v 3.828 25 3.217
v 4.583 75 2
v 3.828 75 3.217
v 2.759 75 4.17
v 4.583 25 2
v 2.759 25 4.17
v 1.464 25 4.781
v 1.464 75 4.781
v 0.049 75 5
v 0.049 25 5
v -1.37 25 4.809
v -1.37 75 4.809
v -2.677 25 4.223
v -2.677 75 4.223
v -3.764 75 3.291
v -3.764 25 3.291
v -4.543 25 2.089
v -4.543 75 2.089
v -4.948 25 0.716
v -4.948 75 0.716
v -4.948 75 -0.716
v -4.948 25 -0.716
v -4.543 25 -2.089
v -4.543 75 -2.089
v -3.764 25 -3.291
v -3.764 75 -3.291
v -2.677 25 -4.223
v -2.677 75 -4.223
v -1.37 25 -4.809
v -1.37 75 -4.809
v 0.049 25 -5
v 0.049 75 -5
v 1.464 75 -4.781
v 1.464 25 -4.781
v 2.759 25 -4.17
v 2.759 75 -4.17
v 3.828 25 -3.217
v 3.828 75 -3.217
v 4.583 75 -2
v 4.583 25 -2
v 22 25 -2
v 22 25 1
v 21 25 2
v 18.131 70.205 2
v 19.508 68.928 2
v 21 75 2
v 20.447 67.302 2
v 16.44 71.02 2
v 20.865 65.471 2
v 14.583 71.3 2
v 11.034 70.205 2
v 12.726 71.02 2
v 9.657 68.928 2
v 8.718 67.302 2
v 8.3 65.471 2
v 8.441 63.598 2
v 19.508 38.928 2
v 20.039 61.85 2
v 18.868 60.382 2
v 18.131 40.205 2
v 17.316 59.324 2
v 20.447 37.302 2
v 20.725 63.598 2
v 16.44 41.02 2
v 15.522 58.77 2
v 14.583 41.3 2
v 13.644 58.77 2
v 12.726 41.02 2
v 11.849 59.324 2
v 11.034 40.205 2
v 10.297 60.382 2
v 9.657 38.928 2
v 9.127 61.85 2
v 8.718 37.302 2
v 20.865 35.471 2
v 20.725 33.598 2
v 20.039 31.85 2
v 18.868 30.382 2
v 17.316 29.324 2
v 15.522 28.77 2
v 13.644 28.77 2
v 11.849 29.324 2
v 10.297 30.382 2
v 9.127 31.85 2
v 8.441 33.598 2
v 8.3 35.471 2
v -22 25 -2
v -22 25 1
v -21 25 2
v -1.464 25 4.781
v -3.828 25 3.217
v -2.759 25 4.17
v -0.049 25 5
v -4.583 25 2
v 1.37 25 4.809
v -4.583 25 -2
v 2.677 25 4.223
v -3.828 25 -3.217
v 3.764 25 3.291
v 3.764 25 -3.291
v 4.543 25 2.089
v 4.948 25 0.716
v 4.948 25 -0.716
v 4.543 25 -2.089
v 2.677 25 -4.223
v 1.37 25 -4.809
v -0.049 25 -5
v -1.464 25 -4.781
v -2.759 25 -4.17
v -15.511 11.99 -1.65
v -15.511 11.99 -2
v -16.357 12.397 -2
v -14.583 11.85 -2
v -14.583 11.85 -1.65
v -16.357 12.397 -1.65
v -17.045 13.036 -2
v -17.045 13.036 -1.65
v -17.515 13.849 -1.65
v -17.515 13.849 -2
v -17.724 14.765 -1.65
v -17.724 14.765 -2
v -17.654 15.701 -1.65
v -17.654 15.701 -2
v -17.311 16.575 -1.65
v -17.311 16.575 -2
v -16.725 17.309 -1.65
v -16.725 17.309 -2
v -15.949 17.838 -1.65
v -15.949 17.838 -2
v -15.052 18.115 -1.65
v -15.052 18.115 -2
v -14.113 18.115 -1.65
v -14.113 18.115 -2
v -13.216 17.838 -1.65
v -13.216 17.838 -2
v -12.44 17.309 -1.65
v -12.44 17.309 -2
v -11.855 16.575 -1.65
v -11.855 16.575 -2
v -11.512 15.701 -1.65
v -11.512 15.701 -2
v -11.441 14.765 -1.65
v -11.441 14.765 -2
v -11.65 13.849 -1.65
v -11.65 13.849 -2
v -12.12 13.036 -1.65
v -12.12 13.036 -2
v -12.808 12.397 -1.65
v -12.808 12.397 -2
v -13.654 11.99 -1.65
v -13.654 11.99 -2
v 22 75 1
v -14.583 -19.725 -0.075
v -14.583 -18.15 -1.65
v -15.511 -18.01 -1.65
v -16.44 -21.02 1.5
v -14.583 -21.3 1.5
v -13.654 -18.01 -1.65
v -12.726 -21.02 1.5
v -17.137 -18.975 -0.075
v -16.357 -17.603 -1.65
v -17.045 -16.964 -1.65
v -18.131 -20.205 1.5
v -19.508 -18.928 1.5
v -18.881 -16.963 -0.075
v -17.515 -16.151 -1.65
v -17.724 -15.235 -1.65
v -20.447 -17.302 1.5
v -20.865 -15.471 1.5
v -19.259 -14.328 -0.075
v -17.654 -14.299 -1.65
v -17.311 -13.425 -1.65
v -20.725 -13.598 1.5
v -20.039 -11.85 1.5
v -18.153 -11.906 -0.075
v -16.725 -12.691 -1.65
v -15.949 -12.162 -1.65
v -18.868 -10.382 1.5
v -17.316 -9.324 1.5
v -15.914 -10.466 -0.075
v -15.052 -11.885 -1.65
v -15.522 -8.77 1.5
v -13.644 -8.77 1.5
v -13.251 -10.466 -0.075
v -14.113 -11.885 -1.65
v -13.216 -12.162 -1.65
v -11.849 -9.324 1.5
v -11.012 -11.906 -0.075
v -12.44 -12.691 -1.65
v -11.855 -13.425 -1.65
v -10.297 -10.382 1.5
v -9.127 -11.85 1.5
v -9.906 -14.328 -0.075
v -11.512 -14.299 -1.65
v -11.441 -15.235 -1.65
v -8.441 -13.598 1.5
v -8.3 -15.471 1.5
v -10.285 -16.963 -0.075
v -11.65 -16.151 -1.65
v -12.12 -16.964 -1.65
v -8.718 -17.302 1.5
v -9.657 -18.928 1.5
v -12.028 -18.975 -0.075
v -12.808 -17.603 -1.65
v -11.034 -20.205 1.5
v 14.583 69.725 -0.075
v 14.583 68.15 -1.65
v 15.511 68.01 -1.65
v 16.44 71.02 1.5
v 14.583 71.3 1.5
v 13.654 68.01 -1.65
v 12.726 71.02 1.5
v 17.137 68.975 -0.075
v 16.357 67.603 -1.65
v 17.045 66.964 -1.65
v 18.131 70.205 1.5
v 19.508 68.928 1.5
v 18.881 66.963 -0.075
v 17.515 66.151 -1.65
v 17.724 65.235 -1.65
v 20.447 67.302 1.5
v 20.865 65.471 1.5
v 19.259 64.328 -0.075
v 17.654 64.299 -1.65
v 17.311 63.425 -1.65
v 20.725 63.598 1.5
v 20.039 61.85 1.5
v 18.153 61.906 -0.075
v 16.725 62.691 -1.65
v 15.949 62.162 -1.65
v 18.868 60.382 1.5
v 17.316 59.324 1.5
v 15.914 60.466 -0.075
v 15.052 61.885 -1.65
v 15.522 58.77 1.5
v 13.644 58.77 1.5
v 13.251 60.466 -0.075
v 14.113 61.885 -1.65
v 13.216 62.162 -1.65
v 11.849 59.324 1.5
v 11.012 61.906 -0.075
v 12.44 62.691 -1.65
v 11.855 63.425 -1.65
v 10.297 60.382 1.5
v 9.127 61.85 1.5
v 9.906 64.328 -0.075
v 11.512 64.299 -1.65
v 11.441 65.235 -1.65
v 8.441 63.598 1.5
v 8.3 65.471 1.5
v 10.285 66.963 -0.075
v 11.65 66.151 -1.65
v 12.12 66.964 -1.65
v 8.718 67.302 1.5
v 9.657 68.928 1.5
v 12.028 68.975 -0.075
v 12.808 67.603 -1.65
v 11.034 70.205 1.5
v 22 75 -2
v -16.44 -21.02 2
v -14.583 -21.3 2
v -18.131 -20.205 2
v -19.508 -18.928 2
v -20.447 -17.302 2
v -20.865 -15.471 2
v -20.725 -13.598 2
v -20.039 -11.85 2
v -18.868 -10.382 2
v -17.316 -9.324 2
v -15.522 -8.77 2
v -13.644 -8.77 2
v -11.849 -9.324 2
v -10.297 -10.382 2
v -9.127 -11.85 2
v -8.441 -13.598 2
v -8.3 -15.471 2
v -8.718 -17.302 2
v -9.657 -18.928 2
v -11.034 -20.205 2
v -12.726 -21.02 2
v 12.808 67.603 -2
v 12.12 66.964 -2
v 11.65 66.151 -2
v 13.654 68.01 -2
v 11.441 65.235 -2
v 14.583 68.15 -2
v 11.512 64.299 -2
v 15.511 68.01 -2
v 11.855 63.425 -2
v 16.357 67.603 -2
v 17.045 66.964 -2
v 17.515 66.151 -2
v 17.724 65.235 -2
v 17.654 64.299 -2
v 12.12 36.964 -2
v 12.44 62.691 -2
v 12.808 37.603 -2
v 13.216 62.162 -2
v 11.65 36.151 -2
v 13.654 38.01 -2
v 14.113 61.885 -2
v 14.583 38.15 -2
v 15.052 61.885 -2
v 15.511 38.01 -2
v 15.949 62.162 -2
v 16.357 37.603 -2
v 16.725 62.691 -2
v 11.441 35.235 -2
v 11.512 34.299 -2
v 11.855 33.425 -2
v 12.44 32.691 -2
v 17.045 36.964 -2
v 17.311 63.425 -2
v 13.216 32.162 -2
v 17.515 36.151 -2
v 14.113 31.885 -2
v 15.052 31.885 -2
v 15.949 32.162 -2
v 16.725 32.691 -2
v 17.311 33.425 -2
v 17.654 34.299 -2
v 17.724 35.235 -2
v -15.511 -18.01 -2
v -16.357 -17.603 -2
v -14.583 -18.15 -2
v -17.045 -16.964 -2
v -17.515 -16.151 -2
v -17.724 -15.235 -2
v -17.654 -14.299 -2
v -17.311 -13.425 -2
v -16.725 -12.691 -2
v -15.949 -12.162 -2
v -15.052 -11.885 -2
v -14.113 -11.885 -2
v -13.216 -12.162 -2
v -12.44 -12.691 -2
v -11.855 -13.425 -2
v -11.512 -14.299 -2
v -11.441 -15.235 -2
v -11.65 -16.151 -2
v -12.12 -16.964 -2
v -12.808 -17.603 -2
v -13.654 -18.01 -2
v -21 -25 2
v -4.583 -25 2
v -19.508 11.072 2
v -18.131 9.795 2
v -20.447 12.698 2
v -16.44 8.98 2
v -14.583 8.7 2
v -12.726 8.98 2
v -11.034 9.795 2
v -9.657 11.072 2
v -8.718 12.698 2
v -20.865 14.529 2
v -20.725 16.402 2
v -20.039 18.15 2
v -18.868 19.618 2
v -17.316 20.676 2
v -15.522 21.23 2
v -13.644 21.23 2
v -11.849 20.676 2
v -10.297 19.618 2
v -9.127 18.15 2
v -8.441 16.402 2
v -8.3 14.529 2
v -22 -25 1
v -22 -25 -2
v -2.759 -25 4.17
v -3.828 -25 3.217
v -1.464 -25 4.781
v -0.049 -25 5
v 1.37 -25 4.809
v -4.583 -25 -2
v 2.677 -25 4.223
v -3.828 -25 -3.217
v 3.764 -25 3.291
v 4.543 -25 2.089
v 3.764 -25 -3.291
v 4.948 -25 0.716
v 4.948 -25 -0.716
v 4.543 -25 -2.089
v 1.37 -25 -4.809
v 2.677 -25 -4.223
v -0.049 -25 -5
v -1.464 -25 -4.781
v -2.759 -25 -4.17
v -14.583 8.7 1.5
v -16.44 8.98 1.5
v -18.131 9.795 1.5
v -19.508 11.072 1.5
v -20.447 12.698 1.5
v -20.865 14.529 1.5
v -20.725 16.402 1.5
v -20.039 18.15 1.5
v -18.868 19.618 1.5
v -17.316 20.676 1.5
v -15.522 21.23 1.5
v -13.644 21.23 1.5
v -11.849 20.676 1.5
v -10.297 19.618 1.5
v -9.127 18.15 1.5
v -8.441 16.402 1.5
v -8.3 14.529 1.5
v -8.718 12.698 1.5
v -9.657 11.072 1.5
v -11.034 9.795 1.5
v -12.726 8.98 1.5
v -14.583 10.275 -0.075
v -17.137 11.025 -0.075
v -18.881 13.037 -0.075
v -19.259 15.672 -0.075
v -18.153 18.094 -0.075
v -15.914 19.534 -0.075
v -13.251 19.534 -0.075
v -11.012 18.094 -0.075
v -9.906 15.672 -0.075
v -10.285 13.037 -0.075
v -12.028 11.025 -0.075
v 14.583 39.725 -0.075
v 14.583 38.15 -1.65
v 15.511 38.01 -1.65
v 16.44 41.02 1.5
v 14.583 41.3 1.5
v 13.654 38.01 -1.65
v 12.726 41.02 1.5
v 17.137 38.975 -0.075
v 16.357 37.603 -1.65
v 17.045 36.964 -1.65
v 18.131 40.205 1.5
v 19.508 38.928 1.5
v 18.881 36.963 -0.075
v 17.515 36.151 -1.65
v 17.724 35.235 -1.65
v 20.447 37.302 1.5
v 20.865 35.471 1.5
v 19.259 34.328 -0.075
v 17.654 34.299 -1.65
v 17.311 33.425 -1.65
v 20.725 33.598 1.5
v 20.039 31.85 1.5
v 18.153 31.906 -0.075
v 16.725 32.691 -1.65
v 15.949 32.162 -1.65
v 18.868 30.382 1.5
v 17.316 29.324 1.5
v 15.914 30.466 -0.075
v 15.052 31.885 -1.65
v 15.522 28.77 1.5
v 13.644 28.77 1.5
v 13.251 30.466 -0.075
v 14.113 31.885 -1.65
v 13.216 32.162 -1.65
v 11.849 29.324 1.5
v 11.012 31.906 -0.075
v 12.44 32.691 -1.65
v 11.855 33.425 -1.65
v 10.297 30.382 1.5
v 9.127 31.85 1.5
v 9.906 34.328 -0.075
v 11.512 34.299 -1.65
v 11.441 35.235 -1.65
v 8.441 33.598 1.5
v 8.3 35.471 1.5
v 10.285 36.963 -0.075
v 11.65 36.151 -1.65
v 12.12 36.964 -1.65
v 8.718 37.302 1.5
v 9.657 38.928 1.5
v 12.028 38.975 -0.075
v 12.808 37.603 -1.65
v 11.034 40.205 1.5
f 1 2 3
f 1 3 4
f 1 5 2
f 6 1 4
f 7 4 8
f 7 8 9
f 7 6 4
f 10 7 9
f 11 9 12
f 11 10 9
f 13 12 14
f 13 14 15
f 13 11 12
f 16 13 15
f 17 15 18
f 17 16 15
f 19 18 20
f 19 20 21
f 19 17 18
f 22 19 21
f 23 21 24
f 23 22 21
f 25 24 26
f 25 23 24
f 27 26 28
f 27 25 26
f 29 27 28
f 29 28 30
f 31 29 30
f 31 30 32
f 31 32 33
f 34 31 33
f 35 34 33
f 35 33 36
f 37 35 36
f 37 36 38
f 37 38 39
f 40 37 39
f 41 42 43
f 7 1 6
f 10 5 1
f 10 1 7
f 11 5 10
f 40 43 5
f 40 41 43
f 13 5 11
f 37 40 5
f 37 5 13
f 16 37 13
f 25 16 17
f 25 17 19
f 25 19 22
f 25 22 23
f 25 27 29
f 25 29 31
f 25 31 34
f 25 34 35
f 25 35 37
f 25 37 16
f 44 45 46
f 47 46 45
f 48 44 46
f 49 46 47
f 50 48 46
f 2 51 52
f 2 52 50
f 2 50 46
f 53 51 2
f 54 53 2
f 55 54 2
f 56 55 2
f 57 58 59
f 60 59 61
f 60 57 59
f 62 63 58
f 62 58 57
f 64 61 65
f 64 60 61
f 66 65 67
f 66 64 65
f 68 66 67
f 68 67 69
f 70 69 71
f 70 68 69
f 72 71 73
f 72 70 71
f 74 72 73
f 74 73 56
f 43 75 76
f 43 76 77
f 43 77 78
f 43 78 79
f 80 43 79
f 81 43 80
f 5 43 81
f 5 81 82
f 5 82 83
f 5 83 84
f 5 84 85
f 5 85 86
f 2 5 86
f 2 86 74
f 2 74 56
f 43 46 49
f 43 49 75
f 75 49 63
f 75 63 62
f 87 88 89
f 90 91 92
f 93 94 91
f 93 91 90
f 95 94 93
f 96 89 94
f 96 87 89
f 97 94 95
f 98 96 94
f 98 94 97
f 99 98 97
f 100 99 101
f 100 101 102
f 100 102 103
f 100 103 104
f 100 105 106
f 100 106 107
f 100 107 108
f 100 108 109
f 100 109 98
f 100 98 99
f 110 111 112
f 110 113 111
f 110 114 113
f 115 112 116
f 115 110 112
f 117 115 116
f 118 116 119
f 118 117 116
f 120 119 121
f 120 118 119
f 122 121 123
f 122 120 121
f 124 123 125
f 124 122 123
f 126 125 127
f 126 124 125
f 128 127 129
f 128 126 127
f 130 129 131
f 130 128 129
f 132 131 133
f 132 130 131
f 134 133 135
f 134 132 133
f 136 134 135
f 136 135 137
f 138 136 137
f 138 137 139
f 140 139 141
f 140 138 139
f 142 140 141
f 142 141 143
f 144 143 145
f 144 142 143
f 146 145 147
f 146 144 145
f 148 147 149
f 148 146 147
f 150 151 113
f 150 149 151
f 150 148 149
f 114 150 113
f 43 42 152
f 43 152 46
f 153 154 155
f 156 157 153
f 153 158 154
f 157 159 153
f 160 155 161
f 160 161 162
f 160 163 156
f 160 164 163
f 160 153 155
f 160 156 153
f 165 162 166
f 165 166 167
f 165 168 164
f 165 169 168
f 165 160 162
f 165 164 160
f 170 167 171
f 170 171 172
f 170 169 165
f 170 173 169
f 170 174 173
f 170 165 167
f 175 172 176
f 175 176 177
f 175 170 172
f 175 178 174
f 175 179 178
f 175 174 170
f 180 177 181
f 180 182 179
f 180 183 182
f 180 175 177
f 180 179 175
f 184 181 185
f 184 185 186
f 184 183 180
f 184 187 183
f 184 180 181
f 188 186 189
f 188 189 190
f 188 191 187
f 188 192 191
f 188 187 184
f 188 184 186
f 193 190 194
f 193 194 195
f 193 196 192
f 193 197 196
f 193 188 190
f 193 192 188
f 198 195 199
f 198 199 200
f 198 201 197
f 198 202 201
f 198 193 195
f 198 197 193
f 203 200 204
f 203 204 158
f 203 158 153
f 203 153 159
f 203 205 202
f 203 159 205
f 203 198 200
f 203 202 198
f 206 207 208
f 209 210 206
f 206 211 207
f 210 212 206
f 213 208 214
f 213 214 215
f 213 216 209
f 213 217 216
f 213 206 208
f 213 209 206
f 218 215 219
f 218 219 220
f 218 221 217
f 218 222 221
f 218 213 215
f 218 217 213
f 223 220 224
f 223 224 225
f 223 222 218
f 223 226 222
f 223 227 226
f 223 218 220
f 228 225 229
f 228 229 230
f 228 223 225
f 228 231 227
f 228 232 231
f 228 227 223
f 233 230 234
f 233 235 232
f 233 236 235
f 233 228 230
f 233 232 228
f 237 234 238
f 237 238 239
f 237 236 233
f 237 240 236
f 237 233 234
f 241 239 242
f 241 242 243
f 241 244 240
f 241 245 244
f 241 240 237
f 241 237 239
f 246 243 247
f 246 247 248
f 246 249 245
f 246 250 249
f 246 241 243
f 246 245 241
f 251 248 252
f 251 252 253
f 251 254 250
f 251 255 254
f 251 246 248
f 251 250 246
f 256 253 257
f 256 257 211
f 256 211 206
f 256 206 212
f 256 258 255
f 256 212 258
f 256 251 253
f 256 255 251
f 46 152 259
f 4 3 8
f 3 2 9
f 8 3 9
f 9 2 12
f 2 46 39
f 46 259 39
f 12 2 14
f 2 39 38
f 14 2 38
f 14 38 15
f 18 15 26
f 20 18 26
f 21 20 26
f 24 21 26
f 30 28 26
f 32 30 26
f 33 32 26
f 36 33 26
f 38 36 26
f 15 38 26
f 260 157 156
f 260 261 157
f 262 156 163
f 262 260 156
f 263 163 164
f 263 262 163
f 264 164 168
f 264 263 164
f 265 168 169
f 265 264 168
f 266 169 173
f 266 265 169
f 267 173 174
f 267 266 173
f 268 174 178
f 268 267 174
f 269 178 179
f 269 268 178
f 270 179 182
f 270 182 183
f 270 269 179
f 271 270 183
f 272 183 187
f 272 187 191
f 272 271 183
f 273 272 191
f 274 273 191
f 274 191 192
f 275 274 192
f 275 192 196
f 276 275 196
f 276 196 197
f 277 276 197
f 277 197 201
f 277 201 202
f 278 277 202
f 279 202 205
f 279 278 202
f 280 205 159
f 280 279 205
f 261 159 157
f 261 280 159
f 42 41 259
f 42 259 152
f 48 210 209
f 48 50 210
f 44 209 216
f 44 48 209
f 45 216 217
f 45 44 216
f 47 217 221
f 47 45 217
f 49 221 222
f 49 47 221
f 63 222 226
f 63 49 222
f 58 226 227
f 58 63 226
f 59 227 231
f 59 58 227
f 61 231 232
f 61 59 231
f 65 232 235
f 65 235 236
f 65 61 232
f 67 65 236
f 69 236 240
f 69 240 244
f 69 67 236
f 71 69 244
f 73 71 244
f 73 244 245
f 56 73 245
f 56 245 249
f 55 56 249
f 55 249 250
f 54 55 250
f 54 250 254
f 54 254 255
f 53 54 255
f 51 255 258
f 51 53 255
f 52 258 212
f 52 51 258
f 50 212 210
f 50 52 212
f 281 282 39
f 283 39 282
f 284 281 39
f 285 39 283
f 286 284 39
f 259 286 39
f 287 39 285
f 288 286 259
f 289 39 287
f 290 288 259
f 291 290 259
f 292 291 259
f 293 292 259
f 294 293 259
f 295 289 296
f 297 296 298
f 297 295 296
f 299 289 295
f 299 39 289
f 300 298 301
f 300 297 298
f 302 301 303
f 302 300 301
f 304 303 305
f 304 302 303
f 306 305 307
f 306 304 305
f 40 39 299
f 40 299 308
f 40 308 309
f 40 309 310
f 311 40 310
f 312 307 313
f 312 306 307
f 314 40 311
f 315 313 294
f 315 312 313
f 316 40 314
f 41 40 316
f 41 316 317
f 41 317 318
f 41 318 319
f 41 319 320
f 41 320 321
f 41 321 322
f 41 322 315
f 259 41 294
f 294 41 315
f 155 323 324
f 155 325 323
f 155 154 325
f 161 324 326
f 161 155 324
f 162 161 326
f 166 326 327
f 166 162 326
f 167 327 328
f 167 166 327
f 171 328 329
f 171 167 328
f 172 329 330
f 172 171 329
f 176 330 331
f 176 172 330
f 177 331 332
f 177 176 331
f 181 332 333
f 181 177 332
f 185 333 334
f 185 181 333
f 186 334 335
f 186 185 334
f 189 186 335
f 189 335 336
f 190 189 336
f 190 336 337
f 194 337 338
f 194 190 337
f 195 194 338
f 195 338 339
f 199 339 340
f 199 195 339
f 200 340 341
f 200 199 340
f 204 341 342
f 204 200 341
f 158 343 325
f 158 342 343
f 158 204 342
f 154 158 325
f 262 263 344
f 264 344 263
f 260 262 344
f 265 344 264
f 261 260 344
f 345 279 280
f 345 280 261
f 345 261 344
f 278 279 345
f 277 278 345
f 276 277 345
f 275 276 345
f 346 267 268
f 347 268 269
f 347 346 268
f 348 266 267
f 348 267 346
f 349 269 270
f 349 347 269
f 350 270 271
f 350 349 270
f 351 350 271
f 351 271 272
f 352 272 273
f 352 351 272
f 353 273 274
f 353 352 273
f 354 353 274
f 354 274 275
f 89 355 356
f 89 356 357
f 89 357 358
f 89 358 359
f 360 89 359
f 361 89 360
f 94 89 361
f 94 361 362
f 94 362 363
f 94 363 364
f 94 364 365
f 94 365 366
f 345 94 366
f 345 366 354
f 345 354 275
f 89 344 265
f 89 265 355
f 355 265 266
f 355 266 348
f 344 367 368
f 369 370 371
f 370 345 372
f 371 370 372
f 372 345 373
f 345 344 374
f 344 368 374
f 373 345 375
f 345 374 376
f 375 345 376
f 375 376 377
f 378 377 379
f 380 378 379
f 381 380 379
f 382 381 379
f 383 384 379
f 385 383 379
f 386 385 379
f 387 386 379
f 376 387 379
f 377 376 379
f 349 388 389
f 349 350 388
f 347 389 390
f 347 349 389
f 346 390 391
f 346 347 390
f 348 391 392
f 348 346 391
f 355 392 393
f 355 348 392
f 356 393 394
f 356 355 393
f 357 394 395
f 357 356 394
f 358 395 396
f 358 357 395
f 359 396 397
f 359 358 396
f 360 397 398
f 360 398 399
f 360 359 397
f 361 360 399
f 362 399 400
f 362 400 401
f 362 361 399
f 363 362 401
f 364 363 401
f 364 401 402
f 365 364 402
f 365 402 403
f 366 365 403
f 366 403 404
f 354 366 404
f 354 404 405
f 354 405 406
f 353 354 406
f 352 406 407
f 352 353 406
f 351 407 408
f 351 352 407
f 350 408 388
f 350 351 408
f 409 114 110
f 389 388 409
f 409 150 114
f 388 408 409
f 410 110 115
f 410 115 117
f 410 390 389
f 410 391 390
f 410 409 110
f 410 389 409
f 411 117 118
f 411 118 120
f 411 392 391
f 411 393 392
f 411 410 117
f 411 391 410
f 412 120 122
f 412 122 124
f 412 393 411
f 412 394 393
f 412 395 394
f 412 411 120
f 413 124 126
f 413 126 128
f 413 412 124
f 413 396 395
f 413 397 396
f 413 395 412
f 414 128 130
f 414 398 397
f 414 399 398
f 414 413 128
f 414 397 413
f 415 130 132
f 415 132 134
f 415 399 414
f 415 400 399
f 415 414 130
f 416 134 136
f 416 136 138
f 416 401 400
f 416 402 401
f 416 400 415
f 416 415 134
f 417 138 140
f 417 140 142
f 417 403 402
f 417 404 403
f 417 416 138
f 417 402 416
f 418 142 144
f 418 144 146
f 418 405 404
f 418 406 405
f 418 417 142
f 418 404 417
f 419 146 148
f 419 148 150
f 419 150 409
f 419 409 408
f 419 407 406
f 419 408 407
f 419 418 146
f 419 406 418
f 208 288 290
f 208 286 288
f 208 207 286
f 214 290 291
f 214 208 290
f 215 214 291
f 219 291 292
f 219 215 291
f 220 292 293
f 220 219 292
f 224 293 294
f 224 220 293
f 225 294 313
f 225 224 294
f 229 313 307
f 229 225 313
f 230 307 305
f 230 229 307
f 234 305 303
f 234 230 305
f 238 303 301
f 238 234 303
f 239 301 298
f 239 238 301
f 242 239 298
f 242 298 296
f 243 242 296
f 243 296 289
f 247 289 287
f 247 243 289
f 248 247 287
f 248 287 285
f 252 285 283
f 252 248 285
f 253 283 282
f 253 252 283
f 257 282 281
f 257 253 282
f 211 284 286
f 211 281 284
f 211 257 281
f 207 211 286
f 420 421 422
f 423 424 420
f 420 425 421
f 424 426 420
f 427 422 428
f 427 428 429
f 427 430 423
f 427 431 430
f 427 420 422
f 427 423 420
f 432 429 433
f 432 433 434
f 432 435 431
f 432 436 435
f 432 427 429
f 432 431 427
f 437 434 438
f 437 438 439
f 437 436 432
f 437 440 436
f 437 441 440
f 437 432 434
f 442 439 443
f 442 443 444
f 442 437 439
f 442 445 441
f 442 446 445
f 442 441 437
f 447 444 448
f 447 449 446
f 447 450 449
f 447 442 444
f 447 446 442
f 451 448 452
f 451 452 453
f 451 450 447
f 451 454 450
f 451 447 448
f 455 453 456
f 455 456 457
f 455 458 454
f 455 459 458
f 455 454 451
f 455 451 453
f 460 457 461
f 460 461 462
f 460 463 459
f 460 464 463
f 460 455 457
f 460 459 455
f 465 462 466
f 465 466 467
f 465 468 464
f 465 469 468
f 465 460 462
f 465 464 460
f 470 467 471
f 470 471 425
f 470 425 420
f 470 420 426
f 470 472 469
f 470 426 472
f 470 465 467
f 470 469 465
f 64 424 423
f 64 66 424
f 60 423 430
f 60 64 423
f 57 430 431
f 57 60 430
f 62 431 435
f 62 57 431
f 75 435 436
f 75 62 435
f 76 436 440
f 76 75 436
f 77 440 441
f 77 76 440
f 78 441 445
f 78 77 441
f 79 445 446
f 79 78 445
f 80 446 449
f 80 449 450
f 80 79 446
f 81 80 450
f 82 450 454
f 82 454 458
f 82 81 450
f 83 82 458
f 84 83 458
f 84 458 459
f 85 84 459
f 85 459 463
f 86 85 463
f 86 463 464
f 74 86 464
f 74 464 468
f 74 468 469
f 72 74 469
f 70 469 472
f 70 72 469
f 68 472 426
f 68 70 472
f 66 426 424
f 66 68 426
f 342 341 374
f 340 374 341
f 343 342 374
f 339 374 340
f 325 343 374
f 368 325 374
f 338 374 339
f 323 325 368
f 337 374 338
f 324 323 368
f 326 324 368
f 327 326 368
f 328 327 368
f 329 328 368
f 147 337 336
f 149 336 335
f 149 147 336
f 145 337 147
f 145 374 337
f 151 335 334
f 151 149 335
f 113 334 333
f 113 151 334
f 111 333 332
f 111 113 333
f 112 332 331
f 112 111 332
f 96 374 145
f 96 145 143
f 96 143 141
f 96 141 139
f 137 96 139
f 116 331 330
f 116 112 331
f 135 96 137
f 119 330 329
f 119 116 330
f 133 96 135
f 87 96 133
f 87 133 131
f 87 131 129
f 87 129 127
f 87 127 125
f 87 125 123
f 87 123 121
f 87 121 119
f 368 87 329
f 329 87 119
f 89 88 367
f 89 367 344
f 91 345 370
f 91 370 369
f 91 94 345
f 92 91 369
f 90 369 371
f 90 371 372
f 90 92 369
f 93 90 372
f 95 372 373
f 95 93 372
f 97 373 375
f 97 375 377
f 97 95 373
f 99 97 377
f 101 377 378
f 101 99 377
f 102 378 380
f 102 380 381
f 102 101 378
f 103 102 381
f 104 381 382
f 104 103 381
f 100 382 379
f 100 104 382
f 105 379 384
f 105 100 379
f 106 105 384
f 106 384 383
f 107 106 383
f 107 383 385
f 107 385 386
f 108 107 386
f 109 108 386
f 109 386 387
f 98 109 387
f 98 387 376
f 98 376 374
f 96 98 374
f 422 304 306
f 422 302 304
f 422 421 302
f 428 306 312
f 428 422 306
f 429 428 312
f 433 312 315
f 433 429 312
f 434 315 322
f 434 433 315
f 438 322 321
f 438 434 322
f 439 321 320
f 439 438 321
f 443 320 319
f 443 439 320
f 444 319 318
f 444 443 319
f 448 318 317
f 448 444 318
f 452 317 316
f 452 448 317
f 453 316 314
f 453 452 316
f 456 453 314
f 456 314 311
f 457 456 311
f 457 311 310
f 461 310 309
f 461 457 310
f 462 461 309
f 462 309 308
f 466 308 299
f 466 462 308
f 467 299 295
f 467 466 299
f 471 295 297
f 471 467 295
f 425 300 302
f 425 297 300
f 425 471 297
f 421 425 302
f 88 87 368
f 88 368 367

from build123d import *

# Parameters (mm, degrees)
EXTRUDE_1_DEPTH            = 25
HOLE_WIZARD_M61_AT_2_COUNT = 2
HOLE_WIZARD_M61_AT_2_PITCH = 30
PATTERN_CIRCULAR_1_COUNT   = 2


with BuildPart() as part:
    # Эскиз1 → Бобышка-Вытянуть1 (new body, symmetric)
    with BuildSketch(Plane(origin=(0, 0, 0), x_dir=(1, 0, 0), z_dir=(0, 1, 0))):
        with BuildLine():
            Line((-4.582575695, 2), (-22, 2))
            Line((-22, 2), (-22, -1))
            Line((-22, -1), (-21, -2))
            Line((-21, -2), (-4.582575695, -2))
            ThreePointArc((-4.582575695, -2), (5, 0), (-4.582575695, 2))
        make_face()
    extrude(amount=EXTRUDE_1_DEPTH, both=True)

    # Эскиз6 → Зенковка для винта с полупотайной головкой M61 (revolve, cut)
    with BuildSketch(Plane(origin=(-14.582575695, 15, 2), x_dir=(0, -1, 0), z_dir=(1, 0, 0))):
        Polygon((0, 0), (0, 7), (3.15, 7), (3.15, 3.65), (6.3, 0.5), (6.3, 0), align=None)
    hole_wizard_m61 = revolve(axis=Axis((-14.582575695, 15, 8.35), (0, 0, -1)), mode=Mode.SUBTRACT)

    # Зенковка для винта с полупотайной головкой M61 at 2: Зенковка для винта с полупотайной головкой M61 ×2
    with Locations(*[(0, -i * HOLE_WIZARD_M61_AT_2_PITCH, 0) for i in range(1, HOLE_WIZARD_M61_AT_2_COUNT)]):
        add(hole_wizard_m61, mode=Mode.SUBTRACT)


with BuildPart() as pattern_circular_1_1:
    # Круговой массив1: pattern copy
    add(part.part.rotate(Axis((0, 25, 0), (0, 0, 1)), 1 * 360 / PATTERN_CIRCULAR_1_COUNT))


solid = Compound([part.part, pattern_circular_1_1.part])
